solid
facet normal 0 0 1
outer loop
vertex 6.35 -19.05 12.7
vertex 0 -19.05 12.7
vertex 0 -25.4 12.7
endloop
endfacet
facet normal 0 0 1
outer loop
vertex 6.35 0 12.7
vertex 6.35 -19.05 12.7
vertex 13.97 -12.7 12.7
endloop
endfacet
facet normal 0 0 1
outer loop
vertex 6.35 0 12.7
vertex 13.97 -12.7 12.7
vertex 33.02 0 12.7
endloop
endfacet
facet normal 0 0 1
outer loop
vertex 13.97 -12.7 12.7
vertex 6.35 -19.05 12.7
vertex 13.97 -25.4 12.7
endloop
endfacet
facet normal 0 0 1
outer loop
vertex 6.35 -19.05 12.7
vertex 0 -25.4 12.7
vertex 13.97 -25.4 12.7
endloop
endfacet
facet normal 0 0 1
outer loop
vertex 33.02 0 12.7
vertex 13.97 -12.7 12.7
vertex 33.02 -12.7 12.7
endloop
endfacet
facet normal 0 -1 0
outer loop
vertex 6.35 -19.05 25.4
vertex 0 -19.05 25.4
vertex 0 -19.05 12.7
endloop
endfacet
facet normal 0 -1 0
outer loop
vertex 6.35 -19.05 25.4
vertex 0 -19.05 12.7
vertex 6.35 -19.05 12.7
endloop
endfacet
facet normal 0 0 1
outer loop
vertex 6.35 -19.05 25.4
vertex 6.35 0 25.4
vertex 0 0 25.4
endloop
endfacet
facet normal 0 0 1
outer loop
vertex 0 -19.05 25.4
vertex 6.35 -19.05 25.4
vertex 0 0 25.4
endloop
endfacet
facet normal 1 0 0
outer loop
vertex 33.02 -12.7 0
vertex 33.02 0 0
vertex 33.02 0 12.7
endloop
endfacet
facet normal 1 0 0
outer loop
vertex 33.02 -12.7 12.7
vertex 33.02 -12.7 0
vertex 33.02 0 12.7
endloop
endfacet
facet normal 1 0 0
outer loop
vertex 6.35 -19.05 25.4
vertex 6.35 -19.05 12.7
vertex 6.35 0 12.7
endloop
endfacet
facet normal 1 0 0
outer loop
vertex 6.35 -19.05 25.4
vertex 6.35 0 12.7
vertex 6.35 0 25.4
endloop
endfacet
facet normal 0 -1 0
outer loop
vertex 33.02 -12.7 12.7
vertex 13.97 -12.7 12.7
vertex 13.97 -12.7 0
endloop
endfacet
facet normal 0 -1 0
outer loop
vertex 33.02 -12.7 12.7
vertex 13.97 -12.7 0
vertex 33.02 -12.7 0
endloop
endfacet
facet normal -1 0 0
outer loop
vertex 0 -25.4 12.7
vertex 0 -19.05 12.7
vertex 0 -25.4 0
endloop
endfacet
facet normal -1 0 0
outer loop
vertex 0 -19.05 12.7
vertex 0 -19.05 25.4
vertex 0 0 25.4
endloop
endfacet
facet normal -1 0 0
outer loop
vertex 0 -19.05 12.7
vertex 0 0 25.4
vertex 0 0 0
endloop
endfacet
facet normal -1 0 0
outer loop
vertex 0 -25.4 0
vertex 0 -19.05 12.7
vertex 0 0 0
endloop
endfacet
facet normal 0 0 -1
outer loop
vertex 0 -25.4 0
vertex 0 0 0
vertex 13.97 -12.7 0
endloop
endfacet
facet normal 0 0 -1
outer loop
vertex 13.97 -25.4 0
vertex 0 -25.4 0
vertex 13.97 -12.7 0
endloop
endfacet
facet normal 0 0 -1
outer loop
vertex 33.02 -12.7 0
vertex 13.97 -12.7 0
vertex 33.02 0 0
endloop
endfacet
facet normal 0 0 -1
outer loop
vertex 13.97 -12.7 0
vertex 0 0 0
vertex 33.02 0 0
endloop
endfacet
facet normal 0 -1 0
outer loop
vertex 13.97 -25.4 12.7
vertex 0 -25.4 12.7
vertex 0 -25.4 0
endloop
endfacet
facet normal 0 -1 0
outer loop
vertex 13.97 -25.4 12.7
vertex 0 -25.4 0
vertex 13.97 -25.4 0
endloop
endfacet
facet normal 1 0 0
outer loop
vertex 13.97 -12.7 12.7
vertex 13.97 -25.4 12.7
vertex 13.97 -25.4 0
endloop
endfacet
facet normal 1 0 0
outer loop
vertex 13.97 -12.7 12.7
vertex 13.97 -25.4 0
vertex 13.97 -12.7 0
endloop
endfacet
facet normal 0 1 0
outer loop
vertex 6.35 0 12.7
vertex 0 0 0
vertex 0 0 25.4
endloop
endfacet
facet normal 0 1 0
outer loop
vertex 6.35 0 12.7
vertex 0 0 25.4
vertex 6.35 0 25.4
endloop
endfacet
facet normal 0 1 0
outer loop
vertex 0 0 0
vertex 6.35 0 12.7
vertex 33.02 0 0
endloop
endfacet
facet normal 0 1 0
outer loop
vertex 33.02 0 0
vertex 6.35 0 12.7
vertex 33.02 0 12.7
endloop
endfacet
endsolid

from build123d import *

# Parameters (mm, degrees)
F1_DEPTH = 25.4
F2_W     = 6.35
F2_H     = 12.7
F3_DEPTH = 6.35
F4_W     = 19.05
F4_H     = 12.7
F5_DEPTH = 12.701


with BuildPart() as f1:
    # F0 (on Front) → F1 (new body)
    with BuildSketch(Plane.XZ):
        Polygon((0, 25.4), (0, 0), (33.02, 0), (33.02, 12.7), (6.35, 12.7), (6.35, 25.4), align=None)
    extrude(amount=F1_DEPTH)

    # F2 (on face) → F3 (cut)
    with BuildSketch(Plane.XZ.offset(25.4)):
        with Locations((3.175, 19.05)):
            Rectangle(F2_W, F2_H)
    extrude(amount=-F3_DEPTH, mode=Mode.SUBTRACT)

    # F4 (on face) → F5 (cut, through all)
    with BuildSketch(Plane.XY.offset(12.7)):
        with Locations((23.495, -19.05)):
            Rectangle(F4_W, F4_H)
    extrude(amount=-F5_DEPTH, mode=Mode.SUBTRACT)


solid = f1.part
